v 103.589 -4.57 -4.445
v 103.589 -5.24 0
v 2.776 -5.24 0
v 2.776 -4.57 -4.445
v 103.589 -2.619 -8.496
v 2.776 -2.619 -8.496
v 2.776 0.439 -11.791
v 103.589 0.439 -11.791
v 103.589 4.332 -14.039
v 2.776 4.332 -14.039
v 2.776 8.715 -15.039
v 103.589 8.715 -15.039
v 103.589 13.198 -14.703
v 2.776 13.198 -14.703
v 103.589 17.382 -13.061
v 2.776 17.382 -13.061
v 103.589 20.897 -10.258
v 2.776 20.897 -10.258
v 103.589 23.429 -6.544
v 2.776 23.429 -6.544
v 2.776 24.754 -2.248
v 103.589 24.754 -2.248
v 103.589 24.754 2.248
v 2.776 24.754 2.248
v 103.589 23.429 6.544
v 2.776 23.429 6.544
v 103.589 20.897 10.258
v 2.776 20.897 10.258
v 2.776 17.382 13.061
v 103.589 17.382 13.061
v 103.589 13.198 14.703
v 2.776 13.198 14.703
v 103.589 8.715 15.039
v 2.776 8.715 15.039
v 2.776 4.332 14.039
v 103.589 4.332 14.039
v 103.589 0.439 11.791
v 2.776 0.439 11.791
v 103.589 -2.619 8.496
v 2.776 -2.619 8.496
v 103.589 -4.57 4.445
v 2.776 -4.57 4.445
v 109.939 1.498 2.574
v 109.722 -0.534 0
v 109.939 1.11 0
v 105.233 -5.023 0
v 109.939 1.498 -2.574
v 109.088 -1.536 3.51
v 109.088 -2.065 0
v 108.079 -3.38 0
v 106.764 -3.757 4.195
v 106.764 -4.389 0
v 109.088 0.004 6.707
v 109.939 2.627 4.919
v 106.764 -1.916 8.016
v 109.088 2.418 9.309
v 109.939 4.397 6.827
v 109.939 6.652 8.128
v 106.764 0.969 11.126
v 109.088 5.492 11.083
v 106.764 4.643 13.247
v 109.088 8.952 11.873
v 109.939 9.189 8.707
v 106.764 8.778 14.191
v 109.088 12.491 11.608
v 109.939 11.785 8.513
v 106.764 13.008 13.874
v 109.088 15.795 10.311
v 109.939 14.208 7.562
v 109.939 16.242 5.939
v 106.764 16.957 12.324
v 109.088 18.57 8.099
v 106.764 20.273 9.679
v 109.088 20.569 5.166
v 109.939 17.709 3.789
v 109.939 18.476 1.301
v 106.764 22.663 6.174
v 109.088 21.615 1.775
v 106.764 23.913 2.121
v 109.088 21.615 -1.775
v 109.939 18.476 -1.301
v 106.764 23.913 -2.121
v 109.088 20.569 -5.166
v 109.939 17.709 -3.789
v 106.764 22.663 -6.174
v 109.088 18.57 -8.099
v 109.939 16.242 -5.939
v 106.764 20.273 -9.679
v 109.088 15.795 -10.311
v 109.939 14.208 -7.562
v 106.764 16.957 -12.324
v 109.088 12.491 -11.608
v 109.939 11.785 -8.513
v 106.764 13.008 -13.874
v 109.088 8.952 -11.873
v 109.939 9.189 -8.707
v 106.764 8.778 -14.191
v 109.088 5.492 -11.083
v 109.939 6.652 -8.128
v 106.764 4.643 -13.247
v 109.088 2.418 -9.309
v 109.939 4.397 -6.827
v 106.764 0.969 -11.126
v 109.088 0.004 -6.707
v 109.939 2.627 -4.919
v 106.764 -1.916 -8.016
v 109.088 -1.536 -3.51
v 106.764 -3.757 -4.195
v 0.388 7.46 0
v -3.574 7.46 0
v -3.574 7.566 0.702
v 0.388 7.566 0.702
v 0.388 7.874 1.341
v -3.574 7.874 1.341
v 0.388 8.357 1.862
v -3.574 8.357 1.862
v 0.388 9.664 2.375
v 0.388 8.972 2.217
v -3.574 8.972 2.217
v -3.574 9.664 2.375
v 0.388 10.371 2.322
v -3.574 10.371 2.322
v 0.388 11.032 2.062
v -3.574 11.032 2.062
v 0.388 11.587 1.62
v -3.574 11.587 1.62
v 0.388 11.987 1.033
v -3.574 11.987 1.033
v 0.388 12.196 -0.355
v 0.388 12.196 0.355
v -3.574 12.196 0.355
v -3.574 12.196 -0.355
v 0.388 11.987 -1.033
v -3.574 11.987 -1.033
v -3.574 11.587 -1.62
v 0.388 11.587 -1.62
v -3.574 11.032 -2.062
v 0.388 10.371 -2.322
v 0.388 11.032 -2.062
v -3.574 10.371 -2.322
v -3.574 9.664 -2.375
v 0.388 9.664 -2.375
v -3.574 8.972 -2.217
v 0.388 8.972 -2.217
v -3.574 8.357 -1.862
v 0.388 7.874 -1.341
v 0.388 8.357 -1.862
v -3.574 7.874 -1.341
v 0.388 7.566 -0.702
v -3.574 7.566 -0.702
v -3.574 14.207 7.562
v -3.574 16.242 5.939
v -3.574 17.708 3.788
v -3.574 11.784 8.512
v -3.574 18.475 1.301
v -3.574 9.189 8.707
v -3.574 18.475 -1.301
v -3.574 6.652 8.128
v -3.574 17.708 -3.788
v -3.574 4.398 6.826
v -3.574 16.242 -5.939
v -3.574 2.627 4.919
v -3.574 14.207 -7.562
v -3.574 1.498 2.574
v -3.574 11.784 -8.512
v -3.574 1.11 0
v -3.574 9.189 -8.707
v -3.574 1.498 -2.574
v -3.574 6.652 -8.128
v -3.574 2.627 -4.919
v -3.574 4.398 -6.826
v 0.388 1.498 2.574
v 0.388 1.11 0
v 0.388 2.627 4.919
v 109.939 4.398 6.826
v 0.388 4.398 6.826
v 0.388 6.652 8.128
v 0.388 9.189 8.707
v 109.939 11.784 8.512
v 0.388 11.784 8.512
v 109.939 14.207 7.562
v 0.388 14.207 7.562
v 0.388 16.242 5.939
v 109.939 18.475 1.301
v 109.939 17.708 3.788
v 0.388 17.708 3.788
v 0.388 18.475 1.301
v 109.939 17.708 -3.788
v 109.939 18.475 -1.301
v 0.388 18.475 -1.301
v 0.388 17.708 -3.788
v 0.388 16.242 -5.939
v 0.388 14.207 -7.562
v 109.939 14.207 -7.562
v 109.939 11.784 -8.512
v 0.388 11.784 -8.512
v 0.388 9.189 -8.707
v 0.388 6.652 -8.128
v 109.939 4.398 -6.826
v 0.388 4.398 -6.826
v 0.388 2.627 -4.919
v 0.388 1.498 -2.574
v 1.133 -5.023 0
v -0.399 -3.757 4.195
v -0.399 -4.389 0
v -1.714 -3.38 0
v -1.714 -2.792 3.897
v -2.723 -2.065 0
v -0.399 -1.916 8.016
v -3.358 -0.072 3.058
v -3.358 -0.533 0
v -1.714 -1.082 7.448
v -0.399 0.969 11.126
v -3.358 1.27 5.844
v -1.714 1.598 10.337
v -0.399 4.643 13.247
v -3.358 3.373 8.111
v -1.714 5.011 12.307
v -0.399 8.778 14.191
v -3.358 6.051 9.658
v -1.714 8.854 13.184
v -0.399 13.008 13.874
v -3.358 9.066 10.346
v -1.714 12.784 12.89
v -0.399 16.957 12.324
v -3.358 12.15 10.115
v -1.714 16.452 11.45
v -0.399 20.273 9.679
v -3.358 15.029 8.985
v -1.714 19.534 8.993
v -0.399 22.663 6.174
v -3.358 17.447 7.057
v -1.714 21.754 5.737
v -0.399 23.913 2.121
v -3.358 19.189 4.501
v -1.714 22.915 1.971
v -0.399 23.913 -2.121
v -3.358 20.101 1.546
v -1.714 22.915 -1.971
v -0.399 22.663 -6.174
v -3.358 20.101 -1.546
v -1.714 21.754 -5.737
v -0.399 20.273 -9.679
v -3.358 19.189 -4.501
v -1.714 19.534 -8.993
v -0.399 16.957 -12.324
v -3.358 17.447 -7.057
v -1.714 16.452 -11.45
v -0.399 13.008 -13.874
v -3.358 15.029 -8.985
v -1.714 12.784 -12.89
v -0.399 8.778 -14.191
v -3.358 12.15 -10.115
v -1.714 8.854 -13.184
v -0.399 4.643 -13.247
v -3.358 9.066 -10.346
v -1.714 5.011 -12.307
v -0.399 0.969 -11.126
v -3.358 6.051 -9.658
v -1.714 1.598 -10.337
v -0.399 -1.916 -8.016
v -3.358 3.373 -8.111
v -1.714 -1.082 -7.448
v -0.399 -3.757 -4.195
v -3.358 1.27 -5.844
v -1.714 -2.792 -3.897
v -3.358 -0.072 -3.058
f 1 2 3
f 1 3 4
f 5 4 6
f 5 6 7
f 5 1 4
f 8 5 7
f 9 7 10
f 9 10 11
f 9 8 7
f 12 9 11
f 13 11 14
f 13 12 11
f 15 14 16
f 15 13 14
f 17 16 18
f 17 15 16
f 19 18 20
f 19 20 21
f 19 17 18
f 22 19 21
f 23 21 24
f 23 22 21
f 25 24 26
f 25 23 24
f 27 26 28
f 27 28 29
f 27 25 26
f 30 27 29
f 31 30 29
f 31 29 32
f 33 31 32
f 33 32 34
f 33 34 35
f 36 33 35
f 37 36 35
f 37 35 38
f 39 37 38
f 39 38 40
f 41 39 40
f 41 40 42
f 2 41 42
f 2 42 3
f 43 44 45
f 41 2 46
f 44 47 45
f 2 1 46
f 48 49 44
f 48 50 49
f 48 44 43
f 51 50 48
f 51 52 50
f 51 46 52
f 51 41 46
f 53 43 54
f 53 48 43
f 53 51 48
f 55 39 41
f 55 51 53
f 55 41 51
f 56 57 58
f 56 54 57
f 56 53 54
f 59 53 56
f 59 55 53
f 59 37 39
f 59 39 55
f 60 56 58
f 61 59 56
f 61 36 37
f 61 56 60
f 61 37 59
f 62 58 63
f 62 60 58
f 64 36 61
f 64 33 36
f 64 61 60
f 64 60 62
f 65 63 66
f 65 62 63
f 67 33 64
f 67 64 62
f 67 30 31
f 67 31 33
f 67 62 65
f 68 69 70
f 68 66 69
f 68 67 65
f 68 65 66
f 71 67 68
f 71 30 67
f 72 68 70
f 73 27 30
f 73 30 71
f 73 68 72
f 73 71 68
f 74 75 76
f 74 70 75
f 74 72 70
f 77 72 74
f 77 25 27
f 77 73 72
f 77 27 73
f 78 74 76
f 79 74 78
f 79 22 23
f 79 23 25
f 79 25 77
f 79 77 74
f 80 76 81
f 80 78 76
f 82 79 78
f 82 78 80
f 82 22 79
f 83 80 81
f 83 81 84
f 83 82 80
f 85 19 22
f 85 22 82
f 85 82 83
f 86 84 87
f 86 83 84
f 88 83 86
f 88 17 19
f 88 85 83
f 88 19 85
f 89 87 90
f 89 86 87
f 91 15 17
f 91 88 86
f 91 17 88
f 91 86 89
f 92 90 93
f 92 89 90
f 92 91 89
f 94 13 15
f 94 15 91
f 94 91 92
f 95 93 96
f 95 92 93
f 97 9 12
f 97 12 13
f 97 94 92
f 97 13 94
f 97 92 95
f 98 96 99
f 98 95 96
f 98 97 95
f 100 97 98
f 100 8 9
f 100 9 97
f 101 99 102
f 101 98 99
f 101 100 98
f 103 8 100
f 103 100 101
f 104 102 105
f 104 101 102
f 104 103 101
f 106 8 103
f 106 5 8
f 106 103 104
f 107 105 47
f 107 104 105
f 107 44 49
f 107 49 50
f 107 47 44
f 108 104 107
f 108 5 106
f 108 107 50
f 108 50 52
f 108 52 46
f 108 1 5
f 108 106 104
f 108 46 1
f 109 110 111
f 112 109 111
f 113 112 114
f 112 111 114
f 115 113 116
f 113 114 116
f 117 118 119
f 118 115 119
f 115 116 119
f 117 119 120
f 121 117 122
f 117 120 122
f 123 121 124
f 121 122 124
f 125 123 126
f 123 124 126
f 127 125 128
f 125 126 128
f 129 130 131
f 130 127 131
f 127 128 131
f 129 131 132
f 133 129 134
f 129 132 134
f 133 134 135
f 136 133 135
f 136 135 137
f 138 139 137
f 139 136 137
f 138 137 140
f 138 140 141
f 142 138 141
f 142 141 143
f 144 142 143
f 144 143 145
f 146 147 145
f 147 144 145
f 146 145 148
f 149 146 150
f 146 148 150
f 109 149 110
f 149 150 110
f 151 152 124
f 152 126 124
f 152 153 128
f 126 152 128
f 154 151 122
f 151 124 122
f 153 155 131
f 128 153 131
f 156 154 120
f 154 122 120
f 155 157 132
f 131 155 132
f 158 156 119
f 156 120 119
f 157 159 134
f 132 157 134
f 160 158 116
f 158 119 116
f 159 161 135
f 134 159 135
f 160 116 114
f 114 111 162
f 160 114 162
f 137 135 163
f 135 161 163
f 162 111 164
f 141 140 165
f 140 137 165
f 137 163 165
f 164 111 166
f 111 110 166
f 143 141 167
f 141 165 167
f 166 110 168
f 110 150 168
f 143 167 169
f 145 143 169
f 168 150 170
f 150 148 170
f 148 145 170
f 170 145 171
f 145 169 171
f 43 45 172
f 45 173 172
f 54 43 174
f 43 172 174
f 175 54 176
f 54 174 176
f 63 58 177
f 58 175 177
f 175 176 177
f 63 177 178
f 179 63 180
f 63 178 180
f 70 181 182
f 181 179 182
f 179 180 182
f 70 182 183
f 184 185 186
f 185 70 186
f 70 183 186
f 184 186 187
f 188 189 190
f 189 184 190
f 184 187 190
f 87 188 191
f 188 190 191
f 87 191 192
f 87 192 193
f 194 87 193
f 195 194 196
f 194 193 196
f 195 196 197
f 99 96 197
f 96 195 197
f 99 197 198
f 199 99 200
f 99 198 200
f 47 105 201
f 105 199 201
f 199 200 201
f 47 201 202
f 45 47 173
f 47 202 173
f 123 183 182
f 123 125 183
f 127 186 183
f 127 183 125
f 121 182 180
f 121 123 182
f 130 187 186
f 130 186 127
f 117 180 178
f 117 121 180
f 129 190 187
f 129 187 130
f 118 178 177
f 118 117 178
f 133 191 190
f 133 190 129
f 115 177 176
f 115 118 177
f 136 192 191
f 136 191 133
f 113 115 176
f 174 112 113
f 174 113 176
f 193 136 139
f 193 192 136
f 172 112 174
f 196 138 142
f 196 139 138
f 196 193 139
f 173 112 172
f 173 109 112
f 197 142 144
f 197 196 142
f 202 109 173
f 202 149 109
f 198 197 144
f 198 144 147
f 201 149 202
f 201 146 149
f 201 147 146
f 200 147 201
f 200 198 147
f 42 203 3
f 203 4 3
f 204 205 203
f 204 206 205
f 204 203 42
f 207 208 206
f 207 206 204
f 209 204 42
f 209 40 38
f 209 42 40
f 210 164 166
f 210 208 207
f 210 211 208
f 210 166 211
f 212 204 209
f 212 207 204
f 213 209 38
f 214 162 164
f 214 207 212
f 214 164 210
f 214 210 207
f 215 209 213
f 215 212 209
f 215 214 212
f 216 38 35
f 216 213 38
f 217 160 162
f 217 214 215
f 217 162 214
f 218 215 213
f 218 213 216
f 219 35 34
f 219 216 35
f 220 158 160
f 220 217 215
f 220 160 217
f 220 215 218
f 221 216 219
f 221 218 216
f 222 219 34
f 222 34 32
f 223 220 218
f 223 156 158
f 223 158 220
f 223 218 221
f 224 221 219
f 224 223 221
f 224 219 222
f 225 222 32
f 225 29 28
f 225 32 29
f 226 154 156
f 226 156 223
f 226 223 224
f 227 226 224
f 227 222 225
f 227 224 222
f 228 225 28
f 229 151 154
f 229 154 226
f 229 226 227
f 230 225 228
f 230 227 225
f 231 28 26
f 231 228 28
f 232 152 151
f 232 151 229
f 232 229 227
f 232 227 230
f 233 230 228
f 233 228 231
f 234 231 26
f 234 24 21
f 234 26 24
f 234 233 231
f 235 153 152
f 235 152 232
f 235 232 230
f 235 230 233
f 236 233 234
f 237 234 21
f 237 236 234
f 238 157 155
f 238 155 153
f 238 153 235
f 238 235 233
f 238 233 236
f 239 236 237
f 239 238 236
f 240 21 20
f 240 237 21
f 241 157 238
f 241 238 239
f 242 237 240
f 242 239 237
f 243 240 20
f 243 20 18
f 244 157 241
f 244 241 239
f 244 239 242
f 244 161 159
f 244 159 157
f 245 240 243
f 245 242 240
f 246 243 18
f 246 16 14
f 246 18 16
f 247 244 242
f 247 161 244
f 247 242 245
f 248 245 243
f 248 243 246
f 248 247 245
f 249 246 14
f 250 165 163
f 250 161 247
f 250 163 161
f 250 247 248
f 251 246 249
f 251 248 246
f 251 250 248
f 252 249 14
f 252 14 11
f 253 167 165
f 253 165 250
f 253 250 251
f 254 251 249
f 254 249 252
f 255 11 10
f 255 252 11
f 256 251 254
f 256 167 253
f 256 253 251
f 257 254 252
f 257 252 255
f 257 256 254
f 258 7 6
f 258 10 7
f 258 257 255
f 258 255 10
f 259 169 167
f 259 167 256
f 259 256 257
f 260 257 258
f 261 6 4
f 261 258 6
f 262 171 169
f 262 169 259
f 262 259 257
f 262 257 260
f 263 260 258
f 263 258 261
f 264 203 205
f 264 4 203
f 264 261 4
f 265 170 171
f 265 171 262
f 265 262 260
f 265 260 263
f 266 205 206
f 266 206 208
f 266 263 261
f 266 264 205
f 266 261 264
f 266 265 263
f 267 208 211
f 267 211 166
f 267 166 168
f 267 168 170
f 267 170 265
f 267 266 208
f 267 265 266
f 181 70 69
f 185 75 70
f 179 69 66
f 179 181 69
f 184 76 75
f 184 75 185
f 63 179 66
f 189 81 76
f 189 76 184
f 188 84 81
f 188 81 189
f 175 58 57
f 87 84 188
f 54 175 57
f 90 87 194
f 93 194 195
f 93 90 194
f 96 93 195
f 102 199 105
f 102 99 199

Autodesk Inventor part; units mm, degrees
ref_plane "YZ Plane" through (0, 0, 0) normal (1, 0, 0) x (0, 1, 0)
ref_plane "XZ Plane" through (0, 0, 0) normal (0, 1, 0) x (-1, 0, 0)
ref_plane "XY Plane" through (0, 0, 0) normal (0, 0, 1) x (1, 0, 0)
sketch "Sketch1" plane through (0, 0, 0) normal (0, 0, 1) x (1, 0, 0)
  line L0 (-3.5739, 7.4603) -> (-3.5739, -5.2397)
  line L1 (-3.5739, -5.2397) -> (109.9387, -5.2397)
  line L2 (109.9387, -5.2397) -> (109.9387, 1.1103)
  line L3 (109.9387, 1.1103) -> (0.3885, 1.1103)
  line L4 (0.3885, 1.1103) -> (0.3885, 7.4603)
  line L5 (0.3885, 7.4603) -> (-3.5739, 7.4603)
  line L6 (-3.5739, 7.4603) -> (-3.5739, 9.8416)
  line L7 (-3.5739, 9.8416) -> (113.4449, 9.8416)
  point P0 (0, 0)
  dimension "d0" = 3.9624
  dimension "d1" = 113.5126
  dimension "d2" = 6.35
  dimension "d3" = 12.7
  dimension "d4" = 2.3813
revolve "Revolution1" add sketch "Sketch1" angle 360 about axis through (-3.5739, 9.8416, 0) along (1, 0, 0)
fillet "Fillet1" radius 6.35 1 edges at (109.9387, 24.9228, 0)
fillet "Fillet2" radius 6.35 1 edges at (-3.5739, 24.9228, 0)
properties part number "handle bar" material "Rubber"
